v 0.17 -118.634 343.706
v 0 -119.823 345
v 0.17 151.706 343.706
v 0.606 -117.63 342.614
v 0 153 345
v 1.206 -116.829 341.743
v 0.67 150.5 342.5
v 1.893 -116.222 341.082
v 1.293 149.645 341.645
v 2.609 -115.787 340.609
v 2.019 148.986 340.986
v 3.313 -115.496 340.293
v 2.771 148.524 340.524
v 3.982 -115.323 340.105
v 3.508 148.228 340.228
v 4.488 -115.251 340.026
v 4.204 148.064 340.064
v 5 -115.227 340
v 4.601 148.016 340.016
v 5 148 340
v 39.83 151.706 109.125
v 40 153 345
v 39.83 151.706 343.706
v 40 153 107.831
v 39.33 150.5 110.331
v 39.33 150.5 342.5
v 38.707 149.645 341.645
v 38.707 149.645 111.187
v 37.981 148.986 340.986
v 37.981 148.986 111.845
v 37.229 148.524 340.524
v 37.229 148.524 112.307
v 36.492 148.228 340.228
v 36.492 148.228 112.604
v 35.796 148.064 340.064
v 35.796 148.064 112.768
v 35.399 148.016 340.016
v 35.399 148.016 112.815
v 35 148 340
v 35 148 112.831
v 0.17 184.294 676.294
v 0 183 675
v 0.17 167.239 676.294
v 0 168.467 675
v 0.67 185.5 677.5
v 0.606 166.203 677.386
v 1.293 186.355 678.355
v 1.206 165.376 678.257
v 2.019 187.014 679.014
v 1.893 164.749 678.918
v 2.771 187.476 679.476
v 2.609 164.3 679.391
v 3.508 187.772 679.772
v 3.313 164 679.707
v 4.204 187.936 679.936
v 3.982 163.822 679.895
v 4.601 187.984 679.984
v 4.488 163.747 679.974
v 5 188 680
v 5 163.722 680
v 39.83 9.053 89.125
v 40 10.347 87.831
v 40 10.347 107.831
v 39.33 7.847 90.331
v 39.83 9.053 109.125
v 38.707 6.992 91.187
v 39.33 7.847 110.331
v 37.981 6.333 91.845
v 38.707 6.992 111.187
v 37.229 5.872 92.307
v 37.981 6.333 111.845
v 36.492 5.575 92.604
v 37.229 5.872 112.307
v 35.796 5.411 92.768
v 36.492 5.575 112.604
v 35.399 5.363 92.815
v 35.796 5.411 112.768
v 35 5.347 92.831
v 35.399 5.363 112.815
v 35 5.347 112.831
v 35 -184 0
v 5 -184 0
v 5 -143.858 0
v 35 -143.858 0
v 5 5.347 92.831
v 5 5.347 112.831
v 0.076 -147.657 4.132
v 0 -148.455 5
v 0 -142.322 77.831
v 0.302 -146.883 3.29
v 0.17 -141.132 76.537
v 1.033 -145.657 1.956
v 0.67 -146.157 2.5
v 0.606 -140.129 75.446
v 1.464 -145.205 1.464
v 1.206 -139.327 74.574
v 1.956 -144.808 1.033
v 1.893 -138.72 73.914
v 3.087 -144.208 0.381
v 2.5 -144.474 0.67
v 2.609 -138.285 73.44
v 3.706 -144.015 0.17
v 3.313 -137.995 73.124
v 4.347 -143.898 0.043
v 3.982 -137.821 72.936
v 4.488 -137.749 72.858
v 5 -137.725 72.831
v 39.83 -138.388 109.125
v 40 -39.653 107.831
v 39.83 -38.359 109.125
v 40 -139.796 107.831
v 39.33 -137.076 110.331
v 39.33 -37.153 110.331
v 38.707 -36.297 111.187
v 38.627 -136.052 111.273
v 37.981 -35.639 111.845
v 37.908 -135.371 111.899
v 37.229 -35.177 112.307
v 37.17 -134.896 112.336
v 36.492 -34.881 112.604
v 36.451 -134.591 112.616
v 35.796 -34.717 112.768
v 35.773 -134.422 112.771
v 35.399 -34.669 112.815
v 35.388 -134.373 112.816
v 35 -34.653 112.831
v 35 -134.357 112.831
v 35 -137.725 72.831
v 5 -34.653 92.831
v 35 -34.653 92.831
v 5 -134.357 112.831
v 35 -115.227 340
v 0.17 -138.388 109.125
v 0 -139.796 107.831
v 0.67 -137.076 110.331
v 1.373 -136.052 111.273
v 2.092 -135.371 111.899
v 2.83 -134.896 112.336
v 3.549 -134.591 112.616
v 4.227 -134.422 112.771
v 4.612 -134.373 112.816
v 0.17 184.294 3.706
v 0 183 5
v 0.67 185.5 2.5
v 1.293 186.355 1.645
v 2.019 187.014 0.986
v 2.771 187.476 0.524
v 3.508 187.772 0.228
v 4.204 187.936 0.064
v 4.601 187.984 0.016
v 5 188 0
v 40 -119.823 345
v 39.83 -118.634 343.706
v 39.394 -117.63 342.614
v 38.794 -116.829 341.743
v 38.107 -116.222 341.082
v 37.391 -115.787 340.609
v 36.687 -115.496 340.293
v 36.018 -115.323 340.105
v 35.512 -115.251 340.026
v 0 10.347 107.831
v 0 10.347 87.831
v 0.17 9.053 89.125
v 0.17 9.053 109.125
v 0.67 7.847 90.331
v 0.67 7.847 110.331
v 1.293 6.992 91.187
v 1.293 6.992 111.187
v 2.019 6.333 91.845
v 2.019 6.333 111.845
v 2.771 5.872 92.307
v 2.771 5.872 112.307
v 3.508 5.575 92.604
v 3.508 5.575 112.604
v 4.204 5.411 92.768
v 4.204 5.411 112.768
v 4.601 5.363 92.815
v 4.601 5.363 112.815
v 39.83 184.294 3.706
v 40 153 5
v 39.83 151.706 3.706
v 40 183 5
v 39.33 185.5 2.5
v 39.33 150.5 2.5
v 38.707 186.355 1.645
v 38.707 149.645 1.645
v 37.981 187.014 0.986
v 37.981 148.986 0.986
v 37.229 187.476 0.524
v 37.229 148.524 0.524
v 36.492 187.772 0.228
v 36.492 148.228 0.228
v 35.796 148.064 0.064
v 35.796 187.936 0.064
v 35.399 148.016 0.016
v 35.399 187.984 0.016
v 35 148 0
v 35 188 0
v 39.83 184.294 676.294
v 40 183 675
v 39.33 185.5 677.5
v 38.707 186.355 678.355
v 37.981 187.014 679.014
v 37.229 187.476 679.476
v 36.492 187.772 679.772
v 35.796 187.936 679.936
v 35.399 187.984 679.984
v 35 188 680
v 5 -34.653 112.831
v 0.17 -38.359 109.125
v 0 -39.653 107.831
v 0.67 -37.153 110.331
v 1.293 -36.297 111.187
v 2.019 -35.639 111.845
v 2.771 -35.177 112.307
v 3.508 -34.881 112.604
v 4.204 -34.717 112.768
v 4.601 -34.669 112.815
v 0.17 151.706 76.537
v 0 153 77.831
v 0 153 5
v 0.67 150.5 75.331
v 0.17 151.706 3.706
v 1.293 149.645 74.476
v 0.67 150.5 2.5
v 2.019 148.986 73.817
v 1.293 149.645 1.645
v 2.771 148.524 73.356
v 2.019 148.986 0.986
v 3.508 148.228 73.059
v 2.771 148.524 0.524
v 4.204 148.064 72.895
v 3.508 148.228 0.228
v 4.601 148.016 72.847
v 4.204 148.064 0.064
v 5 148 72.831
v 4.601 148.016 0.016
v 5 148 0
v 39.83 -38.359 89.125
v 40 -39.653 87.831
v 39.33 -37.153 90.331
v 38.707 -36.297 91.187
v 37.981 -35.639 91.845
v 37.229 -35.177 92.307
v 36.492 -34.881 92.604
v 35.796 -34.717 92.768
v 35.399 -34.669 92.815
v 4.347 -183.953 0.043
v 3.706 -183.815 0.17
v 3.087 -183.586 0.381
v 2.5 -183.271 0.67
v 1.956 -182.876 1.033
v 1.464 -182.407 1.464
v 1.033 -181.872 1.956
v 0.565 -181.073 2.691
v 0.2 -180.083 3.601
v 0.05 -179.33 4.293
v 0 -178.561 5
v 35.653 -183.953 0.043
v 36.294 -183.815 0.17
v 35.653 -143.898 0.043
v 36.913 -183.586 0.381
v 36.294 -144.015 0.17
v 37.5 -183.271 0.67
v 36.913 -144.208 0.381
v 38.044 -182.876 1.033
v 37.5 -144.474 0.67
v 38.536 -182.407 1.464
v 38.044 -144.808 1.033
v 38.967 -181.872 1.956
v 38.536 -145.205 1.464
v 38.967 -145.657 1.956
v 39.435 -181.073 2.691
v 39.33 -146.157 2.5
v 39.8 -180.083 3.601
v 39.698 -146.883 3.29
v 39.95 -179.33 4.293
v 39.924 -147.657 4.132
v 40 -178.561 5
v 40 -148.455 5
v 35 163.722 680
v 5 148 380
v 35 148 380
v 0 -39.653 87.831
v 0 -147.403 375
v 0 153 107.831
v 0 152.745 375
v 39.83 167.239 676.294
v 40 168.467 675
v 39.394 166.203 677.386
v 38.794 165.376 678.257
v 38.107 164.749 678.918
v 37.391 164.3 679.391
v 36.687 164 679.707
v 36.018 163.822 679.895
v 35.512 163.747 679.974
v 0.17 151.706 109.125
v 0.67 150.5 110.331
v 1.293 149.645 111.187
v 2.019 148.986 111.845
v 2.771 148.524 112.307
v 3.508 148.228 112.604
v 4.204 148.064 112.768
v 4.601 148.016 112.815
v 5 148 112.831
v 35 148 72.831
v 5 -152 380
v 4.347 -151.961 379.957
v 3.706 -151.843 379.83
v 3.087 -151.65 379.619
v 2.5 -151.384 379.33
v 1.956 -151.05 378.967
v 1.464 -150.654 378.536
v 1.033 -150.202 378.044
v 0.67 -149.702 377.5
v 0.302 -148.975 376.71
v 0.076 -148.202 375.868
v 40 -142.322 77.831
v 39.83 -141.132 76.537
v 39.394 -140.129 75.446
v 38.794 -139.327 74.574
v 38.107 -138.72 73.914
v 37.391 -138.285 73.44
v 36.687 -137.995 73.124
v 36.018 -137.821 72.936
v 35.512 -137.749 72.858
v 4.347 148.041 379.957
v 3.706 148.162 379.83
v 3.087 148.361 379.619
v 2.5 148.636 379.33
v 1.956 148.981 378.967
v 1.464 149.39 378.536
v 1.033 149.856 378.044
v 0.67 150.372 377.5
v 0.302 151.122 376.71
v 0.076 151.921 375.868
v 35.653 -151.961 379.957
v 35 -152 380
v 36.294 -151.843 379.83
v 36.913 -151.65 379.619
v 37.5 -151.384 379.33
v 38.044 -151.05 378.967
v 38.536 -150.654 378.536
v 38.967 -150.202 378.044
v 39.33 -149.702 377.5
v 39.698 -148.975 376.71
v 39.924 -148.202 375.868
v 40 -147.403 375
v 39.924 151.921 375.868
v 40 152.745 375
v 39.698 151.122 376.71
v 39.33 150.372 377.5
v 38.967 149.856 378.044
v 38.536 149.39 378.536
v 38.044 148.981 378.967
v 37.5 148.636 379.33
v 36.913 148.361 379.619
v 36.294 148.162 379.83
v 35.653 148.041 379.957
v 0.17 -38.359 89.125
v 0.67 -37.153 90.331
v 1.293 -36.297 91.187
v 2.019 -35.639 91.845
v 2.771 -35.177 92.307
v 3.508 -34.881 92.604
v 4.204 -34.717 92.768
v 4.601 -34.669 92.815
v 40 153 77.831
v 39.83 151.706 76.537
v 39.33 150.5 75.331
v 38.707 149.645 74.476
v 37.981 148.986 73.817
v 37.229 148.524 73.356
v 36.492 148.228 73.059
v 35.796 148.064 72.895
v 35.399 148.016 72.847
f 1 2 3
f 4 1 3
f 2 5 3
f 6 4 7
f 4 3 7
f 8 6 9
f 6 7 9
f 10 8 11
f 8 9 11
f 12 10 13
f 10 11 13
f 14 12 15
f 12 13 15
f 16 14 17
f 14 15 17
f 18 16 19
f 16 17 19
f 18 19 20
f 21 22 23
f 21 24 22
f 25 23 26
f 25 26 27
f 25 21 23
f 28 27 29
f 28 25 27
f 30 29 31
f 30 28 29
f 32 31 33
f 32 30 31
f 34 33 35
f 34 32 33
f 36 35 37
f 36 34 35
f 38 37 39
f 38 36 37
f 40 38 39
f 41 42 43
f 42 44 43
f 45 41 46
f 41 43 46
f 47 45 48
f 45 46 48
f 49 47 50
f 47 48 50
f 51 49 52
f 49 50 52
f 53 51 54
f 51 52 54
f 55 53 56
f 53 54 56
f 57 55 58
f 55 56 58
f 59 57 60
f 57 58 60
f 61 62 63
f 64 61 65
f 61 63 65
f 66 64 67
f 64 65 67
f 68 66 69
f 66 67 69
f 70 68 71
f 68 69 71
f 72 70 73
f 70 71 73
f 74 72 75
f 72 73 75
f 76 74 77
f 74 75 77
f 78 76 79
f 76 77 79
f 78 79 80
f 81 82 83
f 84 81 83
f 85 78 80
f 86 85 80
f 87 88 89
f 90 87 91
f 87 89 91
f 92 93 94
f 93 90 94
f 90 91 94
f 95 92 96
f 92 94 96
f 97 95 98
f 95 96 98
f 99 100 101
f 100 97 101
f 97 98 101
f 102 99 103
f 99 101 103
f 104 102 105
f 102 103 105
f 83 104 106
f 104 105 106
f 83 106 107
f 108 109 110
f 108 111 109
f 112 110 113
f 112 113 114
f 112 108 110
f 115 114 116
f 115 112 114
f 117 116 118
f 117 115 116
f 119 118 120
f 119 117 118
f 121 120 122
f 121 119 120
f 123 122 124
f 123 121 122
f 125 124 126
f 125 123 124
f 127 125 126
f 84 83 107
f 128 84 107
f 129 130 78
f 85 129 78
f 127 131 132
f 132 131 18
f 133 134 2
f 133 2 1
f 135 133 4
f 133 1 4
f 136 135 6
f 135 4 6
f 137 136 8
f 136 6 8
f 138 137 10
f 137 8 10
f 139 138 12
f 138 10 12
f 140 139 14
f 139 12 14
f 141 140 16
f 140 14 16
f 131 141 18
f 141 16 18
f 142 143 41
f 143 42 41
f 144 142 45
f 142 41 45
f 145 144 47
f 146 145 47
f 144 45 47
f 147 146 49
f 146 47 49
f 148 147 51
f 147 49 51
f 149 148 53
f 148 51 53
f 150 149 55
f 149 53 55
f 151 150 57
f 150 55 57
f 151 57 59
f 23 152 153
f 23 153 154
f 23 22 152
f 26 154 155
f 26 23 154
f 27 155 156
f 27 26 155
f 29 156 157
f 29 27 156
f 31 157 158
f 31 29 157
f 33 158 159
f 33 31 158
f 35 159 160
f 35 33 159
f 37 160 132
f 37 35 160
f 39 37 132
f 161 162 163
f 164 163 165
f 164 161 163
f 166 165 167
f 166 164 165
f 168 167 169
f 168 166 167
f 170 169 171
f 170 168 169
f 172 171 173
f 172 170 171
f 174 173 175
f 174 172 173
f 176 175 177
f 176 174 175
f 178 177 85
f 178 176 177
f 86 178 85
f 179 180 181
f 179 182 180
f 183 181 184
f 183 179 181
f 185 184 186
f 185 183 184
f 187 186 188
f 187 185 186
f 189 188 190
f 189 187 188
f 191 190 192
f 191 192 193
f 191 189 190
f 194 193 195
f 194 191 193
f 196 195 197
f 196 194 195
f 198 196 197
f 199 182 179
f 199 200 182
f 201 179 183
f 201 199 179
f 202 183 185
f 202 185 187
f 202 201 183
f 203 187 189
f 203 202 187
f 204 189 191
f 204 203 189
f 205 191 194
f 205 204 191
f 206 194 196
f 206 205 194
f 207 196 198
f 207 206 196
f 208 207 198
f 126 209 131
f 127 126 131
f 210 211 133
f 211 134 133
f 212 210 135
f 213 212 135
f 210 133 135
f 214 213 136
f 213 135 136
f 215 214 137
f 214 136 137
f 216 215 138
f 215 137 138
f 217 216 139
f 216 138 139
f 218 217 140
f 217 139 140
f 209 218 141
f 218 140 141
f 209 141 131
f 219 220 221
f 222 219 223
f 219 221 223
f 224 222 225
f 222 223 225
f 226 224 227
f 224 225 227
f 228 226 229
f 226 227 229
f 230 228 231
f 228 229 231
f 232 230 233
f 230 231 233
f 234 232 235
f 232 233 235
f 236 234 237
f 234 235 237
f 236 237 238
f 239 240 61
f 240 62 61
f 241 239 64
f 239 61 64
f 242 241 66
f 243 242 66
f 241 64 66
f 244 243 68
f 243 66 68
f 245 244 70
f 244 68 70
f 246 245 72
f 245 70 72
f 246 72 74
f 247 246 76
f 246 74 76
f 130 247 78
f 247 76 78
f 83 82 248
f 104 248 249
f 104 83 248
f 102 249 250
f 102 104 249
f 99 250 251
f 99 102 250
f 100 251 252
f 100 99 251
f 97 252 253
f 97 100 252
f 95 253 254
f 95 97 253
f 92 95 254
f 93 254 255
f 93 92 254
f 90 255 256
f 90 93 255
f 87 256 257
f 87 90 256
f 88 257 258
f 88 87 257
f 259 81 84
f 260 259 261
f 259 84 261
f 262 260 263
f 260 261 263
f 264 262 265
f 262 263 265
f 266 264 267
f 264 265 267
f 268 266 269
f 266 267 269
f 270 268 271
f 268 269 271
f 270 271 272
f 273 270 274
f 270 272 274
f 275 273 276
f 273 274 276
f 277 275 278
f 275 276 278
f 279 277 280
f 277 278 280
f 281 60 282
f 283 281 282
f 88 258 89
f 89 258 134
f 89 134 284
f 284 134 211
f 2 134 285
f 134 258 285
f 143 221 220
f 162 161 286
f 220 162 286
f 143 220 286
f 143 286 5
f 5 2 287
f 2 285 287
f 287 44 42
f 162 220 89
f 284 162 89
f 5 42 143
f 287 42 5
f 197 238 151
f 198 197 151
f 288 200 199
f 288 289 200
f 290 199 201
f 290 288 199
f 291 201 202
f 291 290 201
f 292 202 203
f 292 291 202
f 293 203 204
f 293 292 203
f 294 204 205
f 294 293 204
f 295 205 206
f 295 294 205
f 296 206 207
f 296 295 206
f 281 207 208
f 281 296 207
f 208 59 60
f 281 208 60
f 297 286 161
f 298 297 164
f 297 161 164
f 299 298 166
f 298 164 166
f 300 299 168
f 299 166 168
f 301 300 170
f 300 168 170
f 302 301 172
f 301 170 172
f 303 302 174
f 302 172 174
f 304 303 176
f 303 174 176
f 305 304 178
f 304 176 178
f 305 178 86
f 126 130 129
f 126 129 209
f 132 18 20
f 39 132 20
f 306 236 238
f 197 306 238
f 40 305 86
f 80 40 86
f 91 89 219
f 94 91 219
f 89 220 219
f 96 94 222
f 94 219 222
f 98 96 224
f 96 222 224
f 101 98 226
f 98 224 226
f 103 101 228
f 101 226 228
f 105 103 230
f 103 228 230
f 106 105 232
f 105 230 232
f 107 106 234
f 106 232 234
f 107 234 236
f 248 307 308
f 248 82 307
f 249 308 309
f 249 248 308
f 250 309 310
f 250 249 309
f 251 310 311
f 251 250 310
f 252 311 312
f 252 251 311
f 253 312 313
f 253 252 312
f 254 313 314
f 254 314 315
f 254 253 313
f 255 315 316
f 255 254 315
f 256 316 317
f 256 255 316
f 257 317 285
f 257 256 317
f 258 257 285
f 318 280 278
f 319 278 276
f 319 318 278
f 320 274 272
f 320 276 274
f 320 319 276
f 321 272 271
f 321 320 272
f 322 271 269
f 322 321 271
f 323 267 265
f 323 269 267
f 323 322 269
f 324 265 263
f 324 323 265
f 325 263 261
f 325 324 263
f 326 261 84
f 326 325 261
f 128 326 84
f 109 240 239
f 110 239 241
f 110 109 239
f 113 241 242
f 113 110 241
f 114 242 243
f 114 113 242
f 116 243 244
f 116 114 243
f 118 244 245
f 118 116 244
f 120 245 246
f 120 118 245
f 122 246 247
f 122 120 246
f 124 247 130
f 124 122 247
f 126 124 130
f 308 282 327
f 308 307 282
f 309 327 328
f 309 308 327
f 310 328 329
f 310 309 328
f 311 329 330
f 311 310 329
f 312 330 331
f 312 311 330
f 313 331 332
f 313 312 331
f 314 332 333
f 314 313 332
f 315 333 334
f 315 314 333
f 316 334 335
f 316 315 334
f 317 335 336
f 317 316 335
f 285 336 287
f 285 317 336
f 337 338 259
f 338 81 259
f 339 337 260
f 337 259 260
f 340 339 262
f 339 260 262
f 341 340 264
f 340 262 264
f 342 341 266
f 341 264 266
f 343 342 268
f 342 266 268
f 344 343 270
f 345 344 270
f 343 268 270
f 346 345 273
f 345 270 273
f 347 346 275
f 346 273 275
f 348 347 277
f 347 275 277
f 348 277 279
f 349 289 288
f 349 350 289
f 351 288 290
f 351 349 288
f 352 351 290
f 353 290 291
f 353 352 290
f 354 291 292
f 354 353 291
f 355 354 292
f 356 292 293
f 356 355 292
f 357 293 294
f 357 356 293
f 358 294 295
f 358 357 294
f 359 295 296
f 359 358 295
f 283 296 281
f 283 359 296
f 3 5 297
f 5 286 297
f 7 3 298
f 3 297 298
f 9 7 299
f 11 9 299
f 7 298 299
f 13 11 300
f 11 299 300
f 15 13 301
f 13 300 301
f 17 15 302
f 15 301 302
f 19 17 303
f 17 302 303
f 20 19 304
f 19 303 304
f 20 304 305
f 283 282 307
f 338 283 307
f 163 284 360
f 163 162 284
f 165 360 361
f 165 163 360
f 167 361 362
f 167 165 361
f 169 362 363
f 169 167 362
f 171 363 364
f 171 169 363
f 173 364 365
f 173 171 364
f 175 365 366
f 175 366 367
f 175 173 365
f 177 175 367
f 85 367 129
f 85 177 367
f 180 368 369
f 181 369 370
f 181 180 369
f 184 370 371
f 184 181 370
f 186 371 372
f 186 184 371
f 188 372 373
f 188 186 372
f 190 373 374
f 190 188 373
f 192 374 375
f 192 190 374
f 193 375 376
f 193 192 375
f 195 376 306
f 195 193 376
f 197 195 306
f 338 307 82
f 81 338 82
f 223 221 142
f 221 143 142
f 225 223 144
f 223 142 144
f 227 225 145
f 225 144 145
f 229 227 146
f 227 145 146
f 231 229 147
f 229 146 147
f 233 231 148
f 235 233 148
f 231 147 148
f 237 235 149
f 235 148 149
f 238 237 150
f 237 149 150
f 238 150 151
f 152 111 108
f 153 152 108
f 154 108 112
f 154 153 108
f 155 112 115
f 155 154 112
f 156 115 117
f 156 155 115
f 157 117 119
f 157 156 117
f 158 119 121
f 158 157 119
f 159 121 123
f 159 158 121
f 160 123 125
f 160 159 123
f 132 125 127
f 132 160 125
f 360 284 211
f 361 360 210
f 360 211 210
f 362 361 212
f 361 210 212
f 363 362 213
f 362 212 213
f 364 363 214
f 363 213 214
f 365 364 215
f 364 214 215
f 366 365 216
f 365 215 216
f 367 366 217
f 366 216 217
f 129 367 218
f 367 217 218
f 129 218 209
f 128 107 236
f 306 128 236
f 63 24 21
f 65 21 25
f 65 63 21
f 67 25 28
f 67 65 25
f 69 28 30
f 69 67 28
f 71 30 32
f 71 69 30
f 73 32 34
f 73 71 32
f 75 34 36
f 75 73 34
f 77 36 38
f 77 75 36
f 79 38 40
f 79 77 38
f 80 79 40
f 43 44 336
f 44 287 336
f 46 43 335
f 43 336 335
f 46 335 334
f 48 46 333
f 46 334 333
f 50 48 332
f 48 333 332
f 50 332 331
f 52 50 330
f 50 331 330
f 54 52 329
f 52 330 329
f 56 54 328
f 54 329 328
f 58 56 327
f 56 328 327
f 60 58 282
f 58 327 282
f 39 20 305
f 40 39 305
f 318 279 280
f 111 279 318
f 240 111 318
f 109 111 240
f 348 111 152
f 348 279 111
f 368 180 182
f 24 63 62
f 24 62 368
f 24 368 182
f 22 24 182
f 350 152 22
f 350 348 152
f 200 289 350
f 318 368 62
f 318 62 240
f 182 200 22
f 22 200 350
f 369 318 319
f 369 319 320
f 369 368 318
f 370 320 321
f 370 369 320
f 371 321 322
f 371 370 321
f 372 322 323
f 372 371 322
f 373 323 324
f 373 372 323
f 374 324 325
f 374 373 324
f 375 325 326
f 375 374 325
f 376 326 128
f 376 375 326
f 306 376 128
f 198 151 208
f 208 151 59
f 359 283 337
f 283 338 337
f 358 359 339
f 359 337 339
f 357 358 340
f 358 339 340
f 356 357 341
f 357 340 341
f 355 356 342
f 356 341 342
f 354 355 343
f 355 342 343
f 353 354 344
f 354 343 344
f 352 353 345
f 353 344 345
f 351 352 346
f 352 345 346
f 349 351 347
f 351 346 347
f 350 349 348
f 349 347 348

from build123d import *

# Parameters (mm, degrees)
F1_DEPTH = 40
F2_W     = 40
F2_H     = 20
F3_DEPTH = 40.001
F4_R     = 5


with BuildPart() as f1:
    # F0 (on Right) → F1 (new body)
    with BuildSketch(Plane.YZ):
        Polygon((-151.999998, 380), (-184, 0), (-143.858423, 0), (-137.725254, 72.831372), (148.000002, 72.831372), (148.000002, 0), (188.000002, 0), (188.000002, 680), (163.722336, 680), (148.000002, 380), align=None)
        Polygon((148.000002, 112.831372), (-134.356833, 112.831372), (-115.226841, 340), (148.000002, 340), align=None, mode=Mode.SUBTRACT)
    extrude(amount=F1_DEPTH)

    # F2 (on face) → F3 (cut, through all)
    with BuildSketch(Plane.YZ.offset(40)):
        with Locations((-14.652766, 102.831372)):
            Rectangle(F2_W, F2_H)
    extrude(amount=-F3_DEPTH, mode=Mode.SUBTRACT)

    # F4
    f4_edges = [f1.edges().sort_by_distance(p)[0] for p in [
        (40, -167.999999, 190),
        (40, -1.999998, 380),
        (40, -163.929211, 0),
        (40, 155.861169, 530),
        (40, -140.791838, 36.415686),
        (40, 175.861169, 680),
        (40, 5.137374, 72.831372),
        (40, 188.000002, 340),
        (40, 148.000002, 36.415686),
        (40, 168.000002, 0),
        (40, -84.504799, 112.831372),
        (40, -34.652766, 102.831372),
        (40, -14.652766, 92.831372),
        (40, 5.347234, 102.831372),
        (40, 76.673618, 112.831372),
        (40, 148.000002, 226.415686),
        (40, 16.38658, 340),
        (40, -124.791837, 226.415686),
        (0, -167.999999, 190),
        (0, -1.999998, 380),
        (0, -163.929211, 0),
        (0, 155.861169, 530),
        (0, -140.791838, 36.415686),
        (0, 175.861169, 680),
        (0, 5.137374, 72.831372),
        (0, 188.000002, 340),
        (0, 148.000002, 36.415686),
        (0, 168.000002, 0),
        (0, -84.504799, 112.831372),
        (0, -34.652766, 102.831372),
        (0, -14.652766, 92.831372),
        (0, 5.347234, 102.831372),
        (0, 76.673618, 112.831372),
        (0, 148.000002, 226.415686),
        (0, 16.38658, 340),
        (0, -124.791837, 226.415686),
    ]]
    fillet(f4_edges, radius=F4_R)


solid = f1.part
